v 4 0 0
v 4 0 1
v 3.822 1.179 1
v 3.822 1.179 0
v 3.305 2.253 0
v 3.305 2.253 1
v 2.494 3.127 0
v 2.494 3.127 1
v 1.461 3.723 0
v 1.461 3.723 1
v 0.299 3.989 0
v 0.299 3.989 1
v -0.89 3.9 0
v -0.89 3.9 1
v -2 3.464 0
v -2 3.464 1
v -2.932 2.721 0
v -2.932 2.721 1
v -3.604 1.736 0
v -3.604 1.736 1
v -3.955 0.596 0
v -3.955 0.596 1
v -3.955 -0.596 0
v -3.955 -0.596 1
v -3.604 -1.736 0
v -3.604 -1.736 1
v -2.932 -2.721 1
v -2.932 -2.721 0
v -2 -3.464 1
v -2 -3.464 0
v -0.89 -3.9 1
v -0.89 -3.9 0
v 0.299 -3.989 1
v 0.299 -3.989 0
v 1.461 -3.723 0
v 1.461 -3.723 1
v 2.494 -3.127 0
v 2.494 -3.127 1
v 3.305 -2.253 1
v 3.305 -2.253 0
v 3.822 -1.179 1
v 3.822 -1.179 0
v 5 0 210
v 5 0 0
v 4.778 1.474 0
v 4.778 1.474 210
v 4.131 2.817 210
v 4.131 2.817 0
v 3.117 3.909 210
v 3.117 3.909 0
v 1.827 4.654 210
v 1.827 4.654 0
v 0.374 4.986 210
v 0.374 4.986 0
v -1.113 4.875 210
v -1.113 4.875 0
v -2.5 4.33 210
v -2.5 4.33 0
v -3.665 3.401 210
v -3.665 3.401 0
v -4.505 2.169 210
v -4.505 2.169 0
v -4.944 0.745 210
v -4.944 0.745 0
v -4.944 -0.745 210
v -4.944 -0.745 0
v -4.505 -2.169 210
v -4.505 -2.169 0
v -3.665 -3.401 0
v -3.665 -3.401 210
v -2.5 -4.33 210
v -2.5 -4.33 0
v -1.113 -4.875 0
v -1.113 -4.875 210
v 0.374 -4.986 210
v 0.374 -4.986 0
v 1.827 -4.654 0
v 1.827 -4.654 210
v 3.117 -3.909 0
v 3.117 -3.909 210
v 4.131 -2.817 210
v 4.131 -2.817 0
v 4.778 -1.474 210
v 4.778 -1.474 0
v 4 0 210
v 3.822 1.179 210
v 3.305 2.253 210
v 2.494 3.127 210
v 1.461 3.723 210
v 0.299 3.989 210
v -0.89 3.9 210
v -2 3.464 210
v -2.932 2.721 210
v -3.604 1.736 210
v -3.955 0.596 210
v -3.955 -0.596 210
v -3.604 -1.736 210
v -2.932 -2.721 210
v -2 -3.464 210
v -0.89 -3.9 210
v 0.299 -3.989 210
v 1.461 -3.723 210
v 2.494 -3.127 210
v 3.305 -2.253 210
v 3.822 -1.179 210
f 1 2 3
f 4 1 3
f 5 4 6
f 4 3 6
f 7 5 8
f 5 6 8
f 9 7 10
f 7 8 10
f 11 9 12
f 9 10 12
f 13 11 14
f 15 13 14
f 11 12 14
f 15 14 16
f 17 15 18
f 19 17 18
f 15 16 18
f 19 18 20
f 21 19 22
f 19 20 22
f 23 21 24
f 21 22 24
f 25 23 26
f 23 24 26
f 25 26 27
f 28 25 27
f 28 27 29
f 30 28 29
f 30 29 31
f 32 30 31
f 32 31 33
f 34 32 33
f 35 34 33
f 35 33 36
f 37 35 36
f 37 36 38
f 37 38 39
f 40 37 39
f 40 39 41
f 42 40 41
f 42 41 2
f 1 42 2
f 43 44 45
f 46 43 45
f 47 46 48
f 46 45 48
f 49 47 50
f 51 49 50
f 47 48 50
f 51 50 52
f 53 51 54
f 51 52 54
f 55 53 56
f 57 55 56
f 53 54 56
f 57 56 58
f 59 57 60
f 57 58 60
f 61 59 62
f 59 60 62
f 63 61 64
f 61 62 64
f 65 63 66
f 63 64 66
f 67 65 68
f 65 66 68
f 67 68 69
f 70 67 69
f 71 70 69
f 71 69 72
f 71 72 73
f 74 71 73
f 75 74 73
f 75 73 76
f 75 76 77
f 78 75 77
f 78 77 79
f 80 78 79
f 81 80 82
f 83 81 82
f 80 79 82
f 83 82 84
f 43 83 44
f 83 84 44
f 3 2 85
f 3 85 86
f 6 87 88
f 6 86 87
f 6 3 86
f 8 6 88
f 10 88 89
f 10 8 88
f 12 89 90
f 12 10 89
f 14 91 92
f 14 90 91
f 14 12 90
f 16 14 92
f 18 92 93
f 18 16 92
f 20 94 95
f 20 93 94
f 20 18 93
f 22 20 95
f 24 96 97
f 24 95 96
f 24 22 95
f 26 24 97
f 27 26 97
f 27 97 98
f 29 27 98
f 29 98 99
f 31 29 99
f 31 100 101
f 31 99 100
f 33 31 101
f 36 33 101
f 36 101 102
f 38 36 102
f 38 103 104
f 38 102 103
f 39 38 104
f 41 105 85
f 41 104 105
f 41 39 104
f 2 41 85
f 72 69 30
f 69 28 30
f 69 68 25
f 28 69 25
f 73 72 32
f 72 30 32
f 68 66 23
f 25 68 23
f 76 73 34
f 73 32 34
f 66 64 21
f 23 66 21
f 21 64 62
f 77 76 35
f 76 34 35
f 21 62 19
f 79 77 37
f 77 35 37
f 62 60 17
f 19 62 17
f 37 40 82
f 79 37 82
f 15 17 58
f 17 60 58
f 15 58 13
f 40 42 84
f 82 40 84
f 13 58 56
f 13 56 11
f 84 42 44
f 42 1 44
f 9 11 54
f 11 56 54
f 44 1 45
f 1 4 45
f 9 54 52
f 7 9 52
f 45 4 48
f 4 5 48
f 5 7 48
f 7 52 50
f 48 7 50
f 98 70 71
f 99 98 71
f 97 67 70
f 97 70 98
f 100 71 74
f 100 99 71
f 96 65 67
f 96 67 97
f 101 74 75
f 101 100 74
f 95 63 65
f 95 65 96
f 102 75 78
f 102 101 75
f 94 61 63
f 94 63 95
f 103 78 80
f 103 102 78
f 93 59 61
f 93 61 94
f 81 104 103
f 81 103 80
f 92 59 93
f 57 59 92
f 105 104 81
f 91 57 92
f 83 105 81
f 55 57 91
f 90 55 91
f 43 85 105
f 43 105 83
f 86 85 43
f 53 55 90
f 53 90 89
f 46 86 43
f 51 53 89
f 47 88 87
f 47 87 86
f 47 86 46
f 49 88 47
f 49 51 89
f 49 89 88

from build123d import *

# Parameters (mm, degrees)
SKETCH_1_R          = 5
EXTRUDE_1_DEPTH     = 210
SHELL_1_T           = -1
CUT_EXTRUDE_1_REACH = 211.12
SKETCH_2_R          = 4


with BuildPart() as part:
    # 草图1 → 凸台-拉伸1 (new body)
    with BuildSketch(Plane.XY):
        Circle(SKETCH_1_R)
    extrude(amount=EXTRUDE_1_DEPTH)

    # 抽壳1
    shell_1_openings = [part.faces().sort_by_distance(p)[0] for p in [
        (0, 0, 210),
    ]]
    offset(amount=SHELL_1_T, openings=shell_1_openings, kind=Kind.INTERSECTION)

    # 草图2 → 切除-拉伸1 (cut, up to next)
    with BuildSketch(Plane.XY.offset(1), mode=Mode.PRIVATE) as cut_extrude_1_sk1:
        Circle(SKETCH_2_R)
    cut_extrude_1_tool1 = extrude(cut_extrude_1_sk1.sketch, amount=-CUT_EXTRUDE_1_REACH, mode=Mode.PRIVATE) & part.part
    add(cut_extrude_1_tool1.solids().sort_by_distance((0, 0, 1))[0], mode=Mode.SUBTRACT)


solid = part.part
